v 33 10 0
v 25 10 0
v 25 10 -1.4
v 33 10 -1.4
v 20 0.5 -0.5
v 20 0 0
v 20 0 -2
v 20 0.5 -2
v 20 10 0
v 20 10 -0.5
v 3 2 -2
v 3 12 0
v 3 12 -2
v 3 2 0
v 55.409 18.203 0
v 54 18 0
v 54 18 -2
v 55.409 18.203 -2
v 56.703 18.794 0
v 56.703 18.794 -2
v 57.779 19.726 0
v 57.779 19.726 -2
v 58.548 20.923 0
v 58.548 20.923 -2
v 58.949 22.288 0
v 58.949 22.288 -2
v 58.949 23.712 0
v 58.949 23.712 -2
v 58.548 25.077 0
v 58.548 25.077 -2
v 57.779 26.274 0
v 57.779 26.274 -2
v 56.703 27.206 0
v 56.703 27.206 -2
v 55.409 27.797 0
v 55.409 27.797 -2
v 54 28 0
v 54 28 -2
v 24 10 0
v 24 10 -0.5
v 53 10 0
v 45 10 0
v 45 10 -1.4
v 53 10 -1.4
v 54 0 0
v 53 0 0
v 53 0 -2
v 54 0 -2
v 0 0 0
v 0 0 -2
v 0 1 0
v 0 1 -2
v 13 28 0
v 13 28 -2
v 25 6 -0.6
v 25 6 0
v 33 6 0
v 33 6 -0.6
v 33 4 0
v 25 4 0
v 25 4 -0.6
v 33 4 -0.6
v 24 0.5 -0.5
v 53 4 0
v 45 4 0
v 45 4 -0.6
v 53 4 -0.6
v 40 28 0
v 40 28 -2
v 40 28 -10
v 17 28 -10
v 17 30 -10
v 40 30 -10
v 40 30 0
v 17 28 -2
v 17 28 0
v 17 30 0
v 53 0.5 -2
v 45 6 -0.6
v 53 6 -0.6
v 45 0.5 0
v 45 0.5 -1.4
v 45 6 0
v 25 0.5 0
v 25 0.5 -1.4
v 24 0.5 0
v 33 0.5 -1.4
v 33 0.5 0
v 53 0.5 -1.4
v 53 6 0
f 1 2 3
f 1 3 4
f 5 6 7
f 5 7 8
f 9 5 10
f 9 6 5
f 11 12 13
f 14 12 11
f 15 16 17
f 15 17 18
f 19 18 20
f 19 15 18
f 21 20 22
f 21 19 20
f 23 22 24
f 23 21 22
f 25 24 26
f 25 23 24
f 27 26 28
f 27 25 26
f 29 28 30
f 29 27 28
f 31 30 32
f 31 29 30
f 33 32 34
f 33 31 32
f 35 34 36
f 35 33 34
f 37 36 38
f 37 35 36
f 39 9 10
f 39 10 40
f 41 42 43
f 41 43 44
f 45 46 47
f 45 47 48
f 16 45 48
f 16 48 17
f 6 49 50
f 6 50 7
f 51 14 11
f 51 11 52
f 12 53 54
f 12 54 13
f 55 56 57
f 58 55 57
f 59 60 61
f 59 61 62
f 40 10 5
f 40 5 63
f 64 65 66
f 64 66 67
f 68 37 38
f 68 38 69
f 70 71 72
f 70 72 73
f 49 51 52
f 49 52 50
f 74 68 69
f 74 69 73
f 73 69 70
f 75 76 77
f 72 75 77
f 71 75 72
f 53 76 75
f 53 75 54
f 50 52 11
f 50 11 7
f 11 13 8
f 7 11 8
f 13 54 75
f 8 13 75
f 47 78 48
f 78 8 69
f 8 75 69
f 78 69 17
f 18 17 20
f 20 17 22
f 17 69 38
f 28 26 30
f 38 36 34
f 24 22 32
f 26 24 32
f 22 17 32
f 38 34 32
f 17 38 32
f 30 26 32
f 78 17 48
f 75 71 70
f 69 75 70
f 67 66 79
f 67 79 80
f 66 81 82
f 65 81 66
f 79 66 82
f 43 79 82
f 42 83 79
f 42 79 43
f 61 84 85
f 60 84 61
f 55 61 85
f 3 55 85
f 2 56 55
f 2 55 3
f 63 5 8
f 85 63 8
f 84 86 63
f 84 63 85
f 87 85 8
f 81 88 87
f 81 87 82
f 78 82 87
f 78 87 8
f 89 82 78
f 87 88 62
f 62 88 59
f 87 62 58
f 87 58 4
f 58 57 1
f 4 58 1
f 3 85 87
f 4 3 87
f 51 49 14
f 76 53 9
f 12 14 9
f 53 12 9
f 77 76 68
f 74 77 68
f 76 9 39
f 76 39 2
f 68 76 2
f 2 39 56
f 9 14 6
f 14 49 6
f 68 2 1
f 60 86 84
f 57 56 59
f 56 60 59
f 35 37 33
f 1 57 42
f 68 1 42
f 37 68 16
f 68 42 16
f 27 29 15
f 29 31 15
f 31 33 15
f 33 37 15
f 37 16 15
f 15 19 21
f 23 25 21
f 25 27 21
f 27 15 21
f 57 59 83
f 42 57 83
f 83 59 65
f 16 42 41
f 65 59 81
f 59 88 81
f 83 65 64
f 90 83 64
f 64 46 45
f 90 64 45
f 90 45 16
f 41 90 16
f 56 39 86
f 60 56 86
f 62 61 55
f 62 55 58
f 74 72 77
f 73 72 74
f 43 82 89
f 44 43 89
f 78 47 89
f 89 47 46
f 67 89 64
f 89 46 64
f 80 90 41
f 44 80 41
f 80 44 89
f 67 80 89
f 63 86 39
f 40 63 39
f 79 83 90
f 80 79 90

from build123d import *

# Parameters (mm, degrees)
MAINPLATE_DEPTH               = 2
TOPPLATE_W                    = 23
TOPPLATE_H                    = 10
BOSS_EXTRUDE6_DEPTH           = 2
SKETCH7_W                     = 8
SKETCH7_H                     = 0.8
SLOTSFORMETALTABS_DEPTH       = 10
SKETCH8_W                     = 8
SKETCH8_H                     = 4
ACCESSHOLESFORMETALTABS_DEPTH = 1
SKETCH9_W                     = 4
SKETCH9_H                     = 10
CUT_EXTRUDE3_DEPTH            = 0.5
SKETCH10_W                    = 33
SKETCH10_H                    = 0.5
CUT_EXTRUDE4_DEPTH            = 11


with BuildPart() as part:
    # Sketch1 → MainPlate (new body)
    with BuildSketch(Plane.XY):
        with BuildLine():
            Line((0, 0), (54, 0))
            Line((54, 0), (54, 18))
            ThreePointArc((54, 18), (59, 23), (54, 28))
            Line((54, 28), (13, 28))
            Line((13, 28), (3, 12))
            Line((3, 12), (3, 2))
            Line((3, 2), (0, 1))
            Line((0, 1), (0, 0))
        make_face()
    extrude(amount=-MAINPLATE_DEPTH)

    # TopPlate → Boss-Extrude6 (add)
    with BuildSketch(Plane(origin=(0, 28, 0), x_dir=(1, 0, 0), z_dir=(0, 1, 0))):
        with Locations((28.5, 5)):
            Rectangle(TOPPLATE_W, TOPPLATE_H)
    extrude(amount=BOSS_EXTRUDE6_DEPTH)

    # Sketch7 → SlotsForMetalTabs (cut)
    with BuildSketch(Plane.XZ):
        with Locations((49, -1)):
            Rectangle(SKETCH7_W, SKETCH7_H)
        with Locations((29, -1)):
            Rectangle(SKETCH7_W, SKETCH7_H)
    extrude(amount=-SLOTSFORMETALTABS_DEPTH, mode=Mode.SUBTRACT)

    # Sketch8 → AccessHolesForMetalTabs (cut)
    with BuildSketch(Plane.XY):
        with Locations((49, 8)):
            Rectangle(SKETCH8_W, SKETCH8_H)
        with Locations((49, 2)):
            Rectangle(SKETCH8_W, SKETCH8_H)
        with Locations((29, 2)):
            Rectangle(SKETCH8_W, SKETCH8_H)
        with Locations((29, 8)):
            Rectangle(SKETCH8_W, SKETCH8_H)
    extrude(amount=-ACCESSHOLESFORMETALTABS_DEPTH, mode=Mode.SUBTRACT)

    # Sketch9 → Cut-Extrude3 (cut)
    with BuildSketch(Plane.XY):
        with Locations((22, 5)):
            Rectangle(SKETCH9_W, SKETCH9_H)
    extrude(amount=-CUT_EXTRUDE3_DEPTH, mode=Mode.SUBTRACT)

    # Sketch10 → Cut-Extrude4 (cut, through all)
    with BuildSketch(Plane.XY):
        with Locations((36.5, 0.25)):
            Rectangle(SKETCH10_W, SKETCH10_H)
    extrude(amount=-CUT_EXTRUDE4_DEPTH, mode=Mode.SUBTRACT)


solid = part.part
